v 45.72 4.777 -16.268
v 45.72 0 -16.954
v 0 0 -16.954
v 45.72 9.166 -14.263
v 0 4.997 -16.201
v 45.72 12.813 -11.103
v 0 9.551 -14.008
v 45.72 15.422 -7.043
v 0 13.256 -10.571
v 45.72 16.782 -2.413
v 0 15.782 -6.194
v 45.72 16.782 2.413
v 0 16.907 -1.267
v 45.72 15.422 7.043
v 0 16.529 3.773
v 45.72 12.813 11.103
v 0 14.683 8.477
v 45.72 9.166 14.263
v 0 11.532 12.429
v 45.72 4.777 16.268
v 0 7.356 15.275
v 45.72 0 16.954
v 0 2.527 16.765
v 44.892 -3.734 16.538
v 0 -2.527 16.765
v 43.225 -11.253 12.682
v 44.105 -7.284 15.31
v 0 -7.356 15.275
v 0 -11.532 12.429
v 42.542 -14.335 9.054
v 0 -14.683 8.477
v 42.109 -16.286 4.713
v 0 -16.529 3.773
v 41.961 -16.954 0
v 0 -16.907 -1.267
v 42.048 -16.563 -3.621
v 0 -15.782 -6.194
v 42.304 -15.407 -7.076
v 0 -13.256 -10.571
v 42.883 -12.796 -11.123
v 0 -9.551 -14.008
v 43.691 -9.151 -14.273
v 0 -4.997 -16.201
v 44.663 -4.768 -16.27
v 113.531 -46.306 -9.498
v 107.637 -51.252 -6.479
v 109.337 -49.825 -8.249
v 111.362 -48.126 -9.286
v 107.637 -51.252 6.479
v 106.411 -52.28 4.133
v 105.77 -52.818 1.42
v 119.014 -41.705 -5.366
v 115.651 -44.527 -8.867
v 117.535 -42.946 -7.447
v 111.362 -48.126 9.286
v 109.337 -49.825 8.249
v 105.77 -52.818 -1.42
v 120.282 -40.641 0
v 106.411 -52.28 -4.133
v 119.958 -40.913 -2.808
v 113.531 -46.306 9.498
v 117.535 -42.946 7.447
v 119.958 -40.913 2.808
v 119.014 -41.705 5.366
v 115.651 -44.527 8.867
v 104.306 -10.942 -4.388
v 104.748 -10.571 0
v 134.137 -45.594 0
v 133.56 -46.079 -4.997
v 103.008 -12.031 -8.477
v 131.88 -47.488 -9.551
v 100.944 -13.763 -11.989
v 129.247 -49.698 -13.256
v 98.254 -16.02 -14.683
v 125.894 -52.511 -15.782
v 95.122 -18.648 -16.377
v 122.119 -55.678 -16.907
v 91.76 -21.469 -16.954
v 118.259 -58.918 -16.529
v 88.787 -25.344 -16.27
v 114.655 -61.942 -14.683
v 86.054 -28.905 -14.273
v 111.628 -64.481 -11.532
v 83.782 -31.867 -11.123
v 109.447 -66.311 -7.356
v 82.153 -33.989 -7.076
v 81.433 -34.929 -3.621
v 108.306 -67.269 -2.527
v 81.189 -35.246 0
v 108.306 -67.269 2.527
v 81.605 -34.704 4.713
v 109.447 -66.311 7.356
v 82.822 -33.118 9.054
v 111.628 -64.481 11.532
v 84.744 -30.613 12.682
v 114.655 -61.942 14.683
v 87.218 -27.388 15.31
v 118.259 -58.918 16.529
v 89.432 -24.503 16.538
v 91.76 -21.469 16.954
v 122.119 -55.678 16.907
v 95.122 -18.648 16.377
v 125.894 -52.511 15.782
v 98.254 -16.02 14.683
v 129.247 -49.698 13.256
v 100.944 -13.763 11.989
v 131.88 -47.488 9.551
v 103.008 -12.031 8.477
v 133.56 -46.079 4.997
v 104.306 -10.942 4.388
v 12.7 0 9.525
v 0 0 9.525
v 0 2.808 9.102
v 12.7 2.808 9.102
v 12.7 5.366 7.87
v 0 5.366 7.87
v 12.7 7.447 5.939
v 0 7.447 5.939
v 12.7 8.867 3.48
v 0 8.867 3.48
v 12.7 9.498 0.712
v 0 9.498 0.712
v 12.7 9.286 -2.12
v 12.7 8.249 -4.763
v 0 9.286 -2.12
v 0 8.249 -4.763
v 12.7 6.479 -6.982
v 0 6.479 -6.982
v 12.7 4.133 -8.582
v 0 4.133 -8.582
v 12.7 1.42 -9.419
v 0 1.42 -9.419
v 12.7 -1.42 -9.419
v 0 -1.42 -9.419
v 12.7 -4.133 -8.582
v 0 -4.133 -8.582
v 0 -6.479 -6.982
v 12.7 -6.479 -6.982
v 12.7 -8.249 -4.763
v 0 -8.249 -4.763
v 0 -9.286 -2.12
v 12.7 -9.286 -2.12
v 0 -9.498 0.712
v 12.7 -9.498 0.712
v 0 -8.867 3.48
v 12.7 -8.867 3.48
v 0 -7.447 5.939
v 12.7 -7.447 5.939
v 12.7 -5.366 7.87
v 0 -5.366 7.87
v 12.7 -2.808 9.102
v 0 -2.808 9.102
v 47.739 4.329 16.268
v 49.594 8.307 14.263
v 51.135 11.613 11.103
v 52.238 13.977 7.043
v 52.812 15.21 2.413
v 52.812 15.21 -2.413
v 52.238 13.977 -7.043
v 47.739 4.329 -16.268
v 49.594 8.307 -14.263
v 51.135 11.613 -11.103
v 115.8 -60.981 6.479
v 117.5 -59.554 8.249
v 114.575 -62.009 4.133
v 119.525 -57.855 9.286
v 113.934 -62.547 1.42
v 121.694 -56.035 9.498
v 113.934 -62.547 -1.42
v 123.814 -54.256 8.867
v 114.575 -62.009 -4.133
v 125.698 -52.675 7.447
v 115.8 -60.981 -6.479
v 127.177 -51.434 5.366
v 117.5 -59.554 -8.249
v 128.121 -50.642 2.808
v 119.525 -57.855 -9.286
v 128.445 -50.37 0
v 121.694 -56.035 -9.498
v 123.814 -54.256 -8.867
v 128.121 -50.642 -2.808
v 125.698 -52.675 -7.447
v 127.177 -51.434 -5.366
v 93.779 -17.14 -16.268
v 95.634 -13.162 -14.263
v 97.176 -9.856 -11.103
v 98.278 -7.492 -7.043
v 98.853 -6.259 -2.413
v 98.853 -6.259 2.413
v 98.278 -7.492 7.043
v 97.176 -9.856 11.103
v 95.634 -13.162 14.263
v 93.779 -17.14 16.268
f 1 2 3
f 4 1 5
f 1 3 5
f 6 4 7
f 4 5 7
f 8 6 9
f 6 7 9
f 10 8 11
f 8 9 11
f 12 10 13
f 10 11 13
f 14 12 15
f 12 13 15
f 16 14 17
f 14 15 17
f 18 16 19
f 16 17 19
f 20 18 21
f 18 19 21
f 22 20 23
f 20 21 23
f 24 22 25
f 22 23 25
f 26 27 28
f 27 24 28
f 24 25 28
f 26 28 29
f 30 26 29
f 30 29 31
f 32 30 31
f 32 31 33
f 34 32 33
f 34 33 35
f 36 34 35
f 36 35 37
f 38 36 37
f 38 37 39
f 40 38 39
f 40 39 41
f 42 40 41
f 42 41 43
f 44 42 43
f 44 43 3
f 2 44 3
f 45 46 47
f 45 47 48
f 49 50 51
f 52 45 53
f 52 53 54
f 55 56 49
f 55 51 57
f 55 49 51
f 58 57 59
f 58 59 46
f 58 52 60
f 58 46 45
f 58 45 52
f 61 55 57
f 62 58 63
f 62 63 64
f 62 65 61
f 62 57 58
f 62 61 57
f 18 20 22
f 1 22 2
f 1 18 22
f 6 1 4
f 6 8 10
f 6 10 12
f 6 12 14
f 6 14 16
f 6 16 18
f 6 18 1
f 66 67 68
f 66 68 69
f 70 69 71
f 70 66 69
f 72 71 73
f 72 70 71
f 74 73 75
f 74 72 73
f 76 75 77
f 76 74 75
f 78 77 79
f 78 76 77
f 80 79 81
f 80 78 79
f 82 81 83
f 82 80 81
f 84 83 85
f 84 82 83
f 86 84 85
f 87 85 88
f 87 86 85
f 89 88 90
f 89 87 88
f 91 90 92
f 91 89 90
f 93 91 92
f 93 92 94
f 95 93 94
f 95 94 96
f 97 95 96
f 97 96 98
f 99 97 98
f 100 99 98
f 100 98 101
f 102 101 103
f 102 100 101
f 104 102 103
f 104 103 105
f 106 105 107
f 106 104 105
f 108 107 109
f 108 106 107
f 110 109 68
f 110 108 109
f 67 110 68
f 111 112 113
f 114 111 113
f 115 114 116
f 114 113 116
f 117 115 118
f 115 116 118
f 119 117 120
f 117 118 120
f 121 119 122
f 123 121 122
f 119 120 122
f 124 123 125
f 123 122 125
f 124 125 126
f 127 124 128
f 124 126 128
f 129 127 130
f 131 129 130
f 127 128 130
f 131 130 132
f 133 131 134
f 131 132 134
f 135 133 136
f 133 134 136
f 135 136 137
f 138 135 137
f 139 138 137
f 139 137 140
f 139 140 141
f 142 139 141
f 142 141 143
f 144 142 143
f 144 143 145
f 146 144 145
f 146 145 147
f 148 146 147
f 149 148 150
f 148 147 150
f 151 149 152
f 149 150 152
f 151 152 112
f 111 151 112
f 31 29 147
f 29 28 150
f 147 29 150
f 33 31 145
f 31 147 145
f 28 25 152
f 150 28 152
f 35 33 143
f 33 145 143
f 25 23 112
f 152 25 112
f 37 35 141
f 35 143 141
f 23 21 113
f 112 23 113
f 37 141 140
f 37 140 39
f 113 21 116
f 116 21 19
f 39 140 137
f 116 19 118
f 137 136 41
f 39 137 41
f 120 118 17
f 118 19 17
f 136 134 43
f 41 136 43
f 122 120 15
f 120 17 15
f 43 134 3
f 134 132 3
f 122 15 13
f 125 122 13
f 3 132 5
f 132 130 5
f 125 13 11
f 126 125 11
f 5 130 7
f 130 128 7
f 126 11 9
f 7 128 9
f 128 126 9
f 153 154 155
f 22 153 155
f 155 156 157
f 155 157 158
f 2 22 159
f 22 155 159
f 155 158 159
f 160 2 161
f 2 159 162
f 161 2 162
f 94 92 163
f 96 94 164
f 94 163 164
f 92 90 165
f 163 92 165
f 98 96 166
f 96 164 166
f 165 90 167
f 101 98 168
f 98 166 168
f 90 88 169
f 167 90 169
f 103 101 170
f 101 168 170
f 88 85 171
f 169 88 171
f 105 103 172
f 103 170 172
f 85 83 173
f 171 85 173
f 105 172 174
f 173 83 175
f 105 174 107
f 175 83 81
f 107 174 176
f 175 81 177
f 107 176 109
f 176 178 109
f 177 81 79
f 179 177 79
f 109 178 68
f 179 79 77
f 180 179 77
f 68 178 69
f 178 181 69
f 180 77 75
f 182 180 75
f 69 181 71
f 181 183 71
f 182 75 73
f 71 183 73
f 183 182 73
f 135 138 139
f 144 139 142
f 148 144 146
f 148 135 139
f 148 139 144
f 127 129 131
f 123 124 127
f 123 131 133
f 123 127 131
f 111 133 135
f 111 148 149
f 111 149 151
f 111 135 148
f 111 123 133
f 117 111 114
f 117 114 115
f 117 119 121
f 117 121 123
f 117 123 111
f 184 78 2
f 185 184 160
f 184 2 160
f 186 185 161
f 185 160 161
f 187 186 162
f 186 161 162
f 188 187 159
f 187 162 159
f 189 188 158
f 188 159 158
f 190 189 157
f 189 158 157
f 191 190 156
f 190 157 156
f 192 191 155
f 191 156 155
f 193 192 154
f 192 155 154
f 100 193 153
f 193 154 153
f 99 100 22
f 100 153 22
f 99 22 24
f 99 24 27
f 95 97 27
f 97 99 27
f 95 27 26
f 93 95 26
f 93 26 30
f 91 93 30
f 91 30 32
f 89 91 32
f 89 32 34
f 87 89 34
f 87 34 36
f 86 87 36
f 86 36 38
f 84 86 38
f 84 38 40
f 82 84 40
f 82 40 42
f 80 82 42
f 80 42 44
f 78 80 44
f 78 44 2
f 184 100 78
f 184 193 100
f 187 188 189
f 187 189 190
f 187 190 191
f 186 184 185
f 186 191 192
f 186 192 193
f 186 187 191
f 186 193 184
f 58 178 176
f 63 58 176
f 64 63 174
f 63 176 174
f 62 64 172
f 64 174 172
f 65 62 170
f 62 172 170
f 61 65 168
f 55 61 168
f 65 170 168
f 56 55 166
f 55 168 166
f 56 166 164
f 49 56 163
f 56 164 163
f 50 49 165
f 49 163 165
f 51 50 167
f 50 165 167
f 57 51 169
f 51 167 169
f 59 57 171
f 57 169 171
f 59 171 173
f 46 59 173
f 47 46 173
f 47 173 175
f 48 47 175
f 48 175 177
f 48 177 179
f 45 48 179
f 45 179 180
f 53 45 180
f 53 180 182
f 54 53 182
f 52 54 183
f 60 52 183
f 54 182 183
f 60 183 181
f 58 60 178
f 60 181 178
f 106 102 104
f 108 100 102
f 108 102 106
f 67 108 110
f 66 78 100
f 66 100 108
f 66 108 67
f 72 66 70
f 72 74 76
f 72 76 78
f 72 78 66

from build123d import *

# Parameters (mm, degrees)
SKETCH4_R           = 16.9545
BOSS_EXTRUDE1_DEPTH = 45.72
SKETCH5_R           = 16.9545
BOSS_EXTRUDE2_DEPTH = 50.8
SKETCH9_R           = 16.9545
BOSS_EXTRUDE3_DEPTH = 45.72
SKETCH10_R          = 9.525
CUT_EXTRUDE1_DEPTH  = 12.7
SKETCH12_R          = 9.525
CUT_EXTRUDE2_DEPTH  = 12.7


with BuildPart() as part:
    # Sketch4 → Boss-Extrude1 (new body)
    with BuildSketch(Plane(origin=(0, 0, 0), x_dir=(0, 0, -1), z_dir=(1, 0, 0))):
        Circle(SKETCH4_R)
    extrude(amount=BOSS_EXTRUDE1_DEPTH)

    # Sketch5 → Boss-Extrude2 (add)
    with BuildSketch(Plane(origin=(45.72, 0, 0), x_dir=(0, 0, -1), z_dir=(0.906307787, -0.422618262, 0))):
        Circle(SKETCH5_R)
    extrude(amount=BOSS_EXTRUDE2_DEPTH)

    # Sketch9 → Boss-Extrude3 (add)
    with BuildSketch(Plane(origin=(91.760435581, -21.469007696, 0), x_dir=(0.766044443, 0.64278761, 0), z_dir=(-0.64278761, 0.766044443, 0))):
        Circle(SKETCH9_R)
    extrude(amount=-BOSS_EXTRUDE3_DEPTH)

    # Sketch10 → Cut-Extrude1 (cut)
    with BuildSketch(Plane(origin=(77.87287371, -92.805277009, 0), x_dir=(0.766044443, 0.64278761, 0), z_dir=(0.64278761, -0.766044443, 0))):
        with Locations((56.492559636, 0)):
            Circle(SKETCH10_R)
    extrude(amount=-CUT_EXTRUDE1_DEPTH, mode=Mode.SUBTRACT)

    # Sketch12 → Cut-Extrude2 (cut)
    with BuildSketch(Plane.ZY):
        Circle(SKETCH12_R)
    extrude(amount=-CUT_EXTRUDE2_DEPTH, mode=Mode.SUBTRACT)


solid = part.part
